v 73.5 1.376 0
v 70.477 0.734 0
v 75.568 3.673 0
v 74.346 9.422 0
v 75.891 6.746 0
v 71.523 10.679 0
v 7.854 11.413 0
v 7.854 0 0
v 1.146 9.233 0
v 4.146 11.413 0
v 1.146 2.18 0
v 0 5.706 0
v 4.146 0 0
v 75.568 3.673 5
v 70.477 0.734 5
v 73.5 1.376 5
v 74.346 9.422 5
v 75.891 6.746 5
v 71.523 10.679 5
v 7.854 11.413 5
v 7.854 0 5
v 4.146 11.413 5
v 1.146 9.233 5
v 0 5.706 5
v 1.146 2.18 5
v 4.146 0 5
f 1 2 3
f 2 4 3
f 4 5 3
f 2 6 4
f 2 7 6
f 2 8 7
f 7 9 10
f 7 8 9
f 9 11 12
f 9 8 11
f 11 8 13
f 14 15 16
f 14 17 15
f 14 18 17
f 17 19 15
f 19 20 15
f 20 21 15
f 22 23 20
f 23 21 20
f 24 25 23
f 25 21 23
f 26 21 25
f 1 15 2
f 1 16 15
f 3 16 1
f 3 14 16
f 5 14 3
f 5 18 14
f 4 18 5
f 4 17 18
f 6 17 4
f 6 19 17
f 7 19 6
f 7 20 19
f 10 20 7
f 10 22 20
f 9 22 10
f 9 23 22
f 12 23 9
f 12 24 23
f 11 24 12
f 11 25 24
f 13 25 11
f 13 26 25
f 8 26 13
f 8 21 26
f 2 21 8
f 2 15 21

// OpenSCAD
$fn = 32;

// ----------------------------------------------------------------------
// Lever arm: two bosses 12 and 10 mm, 65 mm between centres
// ----------------------------------------------------------------------

// --- parameters (mm) ---
profile_height = 5;       // extrusion height
profile_points = 13;      // points of the closed outline

profile = [[0, 5.706], [1.146, 2.18], [4.146, 0], [7.854, 0], [70.477, 0.734], [73.5, 1.376], [75.568, 3.673], [75.891, 6.746], [74.346, 9.422], [71.523, 10.679], [7.854, 11.413], [4.146, 11.413], [1.146, 9.233]];  // single closed polygon, 13 points, counter clockwise

// --- the one profile operation ---
linear_extrude(height = profile_height) polygon(points = profile);
